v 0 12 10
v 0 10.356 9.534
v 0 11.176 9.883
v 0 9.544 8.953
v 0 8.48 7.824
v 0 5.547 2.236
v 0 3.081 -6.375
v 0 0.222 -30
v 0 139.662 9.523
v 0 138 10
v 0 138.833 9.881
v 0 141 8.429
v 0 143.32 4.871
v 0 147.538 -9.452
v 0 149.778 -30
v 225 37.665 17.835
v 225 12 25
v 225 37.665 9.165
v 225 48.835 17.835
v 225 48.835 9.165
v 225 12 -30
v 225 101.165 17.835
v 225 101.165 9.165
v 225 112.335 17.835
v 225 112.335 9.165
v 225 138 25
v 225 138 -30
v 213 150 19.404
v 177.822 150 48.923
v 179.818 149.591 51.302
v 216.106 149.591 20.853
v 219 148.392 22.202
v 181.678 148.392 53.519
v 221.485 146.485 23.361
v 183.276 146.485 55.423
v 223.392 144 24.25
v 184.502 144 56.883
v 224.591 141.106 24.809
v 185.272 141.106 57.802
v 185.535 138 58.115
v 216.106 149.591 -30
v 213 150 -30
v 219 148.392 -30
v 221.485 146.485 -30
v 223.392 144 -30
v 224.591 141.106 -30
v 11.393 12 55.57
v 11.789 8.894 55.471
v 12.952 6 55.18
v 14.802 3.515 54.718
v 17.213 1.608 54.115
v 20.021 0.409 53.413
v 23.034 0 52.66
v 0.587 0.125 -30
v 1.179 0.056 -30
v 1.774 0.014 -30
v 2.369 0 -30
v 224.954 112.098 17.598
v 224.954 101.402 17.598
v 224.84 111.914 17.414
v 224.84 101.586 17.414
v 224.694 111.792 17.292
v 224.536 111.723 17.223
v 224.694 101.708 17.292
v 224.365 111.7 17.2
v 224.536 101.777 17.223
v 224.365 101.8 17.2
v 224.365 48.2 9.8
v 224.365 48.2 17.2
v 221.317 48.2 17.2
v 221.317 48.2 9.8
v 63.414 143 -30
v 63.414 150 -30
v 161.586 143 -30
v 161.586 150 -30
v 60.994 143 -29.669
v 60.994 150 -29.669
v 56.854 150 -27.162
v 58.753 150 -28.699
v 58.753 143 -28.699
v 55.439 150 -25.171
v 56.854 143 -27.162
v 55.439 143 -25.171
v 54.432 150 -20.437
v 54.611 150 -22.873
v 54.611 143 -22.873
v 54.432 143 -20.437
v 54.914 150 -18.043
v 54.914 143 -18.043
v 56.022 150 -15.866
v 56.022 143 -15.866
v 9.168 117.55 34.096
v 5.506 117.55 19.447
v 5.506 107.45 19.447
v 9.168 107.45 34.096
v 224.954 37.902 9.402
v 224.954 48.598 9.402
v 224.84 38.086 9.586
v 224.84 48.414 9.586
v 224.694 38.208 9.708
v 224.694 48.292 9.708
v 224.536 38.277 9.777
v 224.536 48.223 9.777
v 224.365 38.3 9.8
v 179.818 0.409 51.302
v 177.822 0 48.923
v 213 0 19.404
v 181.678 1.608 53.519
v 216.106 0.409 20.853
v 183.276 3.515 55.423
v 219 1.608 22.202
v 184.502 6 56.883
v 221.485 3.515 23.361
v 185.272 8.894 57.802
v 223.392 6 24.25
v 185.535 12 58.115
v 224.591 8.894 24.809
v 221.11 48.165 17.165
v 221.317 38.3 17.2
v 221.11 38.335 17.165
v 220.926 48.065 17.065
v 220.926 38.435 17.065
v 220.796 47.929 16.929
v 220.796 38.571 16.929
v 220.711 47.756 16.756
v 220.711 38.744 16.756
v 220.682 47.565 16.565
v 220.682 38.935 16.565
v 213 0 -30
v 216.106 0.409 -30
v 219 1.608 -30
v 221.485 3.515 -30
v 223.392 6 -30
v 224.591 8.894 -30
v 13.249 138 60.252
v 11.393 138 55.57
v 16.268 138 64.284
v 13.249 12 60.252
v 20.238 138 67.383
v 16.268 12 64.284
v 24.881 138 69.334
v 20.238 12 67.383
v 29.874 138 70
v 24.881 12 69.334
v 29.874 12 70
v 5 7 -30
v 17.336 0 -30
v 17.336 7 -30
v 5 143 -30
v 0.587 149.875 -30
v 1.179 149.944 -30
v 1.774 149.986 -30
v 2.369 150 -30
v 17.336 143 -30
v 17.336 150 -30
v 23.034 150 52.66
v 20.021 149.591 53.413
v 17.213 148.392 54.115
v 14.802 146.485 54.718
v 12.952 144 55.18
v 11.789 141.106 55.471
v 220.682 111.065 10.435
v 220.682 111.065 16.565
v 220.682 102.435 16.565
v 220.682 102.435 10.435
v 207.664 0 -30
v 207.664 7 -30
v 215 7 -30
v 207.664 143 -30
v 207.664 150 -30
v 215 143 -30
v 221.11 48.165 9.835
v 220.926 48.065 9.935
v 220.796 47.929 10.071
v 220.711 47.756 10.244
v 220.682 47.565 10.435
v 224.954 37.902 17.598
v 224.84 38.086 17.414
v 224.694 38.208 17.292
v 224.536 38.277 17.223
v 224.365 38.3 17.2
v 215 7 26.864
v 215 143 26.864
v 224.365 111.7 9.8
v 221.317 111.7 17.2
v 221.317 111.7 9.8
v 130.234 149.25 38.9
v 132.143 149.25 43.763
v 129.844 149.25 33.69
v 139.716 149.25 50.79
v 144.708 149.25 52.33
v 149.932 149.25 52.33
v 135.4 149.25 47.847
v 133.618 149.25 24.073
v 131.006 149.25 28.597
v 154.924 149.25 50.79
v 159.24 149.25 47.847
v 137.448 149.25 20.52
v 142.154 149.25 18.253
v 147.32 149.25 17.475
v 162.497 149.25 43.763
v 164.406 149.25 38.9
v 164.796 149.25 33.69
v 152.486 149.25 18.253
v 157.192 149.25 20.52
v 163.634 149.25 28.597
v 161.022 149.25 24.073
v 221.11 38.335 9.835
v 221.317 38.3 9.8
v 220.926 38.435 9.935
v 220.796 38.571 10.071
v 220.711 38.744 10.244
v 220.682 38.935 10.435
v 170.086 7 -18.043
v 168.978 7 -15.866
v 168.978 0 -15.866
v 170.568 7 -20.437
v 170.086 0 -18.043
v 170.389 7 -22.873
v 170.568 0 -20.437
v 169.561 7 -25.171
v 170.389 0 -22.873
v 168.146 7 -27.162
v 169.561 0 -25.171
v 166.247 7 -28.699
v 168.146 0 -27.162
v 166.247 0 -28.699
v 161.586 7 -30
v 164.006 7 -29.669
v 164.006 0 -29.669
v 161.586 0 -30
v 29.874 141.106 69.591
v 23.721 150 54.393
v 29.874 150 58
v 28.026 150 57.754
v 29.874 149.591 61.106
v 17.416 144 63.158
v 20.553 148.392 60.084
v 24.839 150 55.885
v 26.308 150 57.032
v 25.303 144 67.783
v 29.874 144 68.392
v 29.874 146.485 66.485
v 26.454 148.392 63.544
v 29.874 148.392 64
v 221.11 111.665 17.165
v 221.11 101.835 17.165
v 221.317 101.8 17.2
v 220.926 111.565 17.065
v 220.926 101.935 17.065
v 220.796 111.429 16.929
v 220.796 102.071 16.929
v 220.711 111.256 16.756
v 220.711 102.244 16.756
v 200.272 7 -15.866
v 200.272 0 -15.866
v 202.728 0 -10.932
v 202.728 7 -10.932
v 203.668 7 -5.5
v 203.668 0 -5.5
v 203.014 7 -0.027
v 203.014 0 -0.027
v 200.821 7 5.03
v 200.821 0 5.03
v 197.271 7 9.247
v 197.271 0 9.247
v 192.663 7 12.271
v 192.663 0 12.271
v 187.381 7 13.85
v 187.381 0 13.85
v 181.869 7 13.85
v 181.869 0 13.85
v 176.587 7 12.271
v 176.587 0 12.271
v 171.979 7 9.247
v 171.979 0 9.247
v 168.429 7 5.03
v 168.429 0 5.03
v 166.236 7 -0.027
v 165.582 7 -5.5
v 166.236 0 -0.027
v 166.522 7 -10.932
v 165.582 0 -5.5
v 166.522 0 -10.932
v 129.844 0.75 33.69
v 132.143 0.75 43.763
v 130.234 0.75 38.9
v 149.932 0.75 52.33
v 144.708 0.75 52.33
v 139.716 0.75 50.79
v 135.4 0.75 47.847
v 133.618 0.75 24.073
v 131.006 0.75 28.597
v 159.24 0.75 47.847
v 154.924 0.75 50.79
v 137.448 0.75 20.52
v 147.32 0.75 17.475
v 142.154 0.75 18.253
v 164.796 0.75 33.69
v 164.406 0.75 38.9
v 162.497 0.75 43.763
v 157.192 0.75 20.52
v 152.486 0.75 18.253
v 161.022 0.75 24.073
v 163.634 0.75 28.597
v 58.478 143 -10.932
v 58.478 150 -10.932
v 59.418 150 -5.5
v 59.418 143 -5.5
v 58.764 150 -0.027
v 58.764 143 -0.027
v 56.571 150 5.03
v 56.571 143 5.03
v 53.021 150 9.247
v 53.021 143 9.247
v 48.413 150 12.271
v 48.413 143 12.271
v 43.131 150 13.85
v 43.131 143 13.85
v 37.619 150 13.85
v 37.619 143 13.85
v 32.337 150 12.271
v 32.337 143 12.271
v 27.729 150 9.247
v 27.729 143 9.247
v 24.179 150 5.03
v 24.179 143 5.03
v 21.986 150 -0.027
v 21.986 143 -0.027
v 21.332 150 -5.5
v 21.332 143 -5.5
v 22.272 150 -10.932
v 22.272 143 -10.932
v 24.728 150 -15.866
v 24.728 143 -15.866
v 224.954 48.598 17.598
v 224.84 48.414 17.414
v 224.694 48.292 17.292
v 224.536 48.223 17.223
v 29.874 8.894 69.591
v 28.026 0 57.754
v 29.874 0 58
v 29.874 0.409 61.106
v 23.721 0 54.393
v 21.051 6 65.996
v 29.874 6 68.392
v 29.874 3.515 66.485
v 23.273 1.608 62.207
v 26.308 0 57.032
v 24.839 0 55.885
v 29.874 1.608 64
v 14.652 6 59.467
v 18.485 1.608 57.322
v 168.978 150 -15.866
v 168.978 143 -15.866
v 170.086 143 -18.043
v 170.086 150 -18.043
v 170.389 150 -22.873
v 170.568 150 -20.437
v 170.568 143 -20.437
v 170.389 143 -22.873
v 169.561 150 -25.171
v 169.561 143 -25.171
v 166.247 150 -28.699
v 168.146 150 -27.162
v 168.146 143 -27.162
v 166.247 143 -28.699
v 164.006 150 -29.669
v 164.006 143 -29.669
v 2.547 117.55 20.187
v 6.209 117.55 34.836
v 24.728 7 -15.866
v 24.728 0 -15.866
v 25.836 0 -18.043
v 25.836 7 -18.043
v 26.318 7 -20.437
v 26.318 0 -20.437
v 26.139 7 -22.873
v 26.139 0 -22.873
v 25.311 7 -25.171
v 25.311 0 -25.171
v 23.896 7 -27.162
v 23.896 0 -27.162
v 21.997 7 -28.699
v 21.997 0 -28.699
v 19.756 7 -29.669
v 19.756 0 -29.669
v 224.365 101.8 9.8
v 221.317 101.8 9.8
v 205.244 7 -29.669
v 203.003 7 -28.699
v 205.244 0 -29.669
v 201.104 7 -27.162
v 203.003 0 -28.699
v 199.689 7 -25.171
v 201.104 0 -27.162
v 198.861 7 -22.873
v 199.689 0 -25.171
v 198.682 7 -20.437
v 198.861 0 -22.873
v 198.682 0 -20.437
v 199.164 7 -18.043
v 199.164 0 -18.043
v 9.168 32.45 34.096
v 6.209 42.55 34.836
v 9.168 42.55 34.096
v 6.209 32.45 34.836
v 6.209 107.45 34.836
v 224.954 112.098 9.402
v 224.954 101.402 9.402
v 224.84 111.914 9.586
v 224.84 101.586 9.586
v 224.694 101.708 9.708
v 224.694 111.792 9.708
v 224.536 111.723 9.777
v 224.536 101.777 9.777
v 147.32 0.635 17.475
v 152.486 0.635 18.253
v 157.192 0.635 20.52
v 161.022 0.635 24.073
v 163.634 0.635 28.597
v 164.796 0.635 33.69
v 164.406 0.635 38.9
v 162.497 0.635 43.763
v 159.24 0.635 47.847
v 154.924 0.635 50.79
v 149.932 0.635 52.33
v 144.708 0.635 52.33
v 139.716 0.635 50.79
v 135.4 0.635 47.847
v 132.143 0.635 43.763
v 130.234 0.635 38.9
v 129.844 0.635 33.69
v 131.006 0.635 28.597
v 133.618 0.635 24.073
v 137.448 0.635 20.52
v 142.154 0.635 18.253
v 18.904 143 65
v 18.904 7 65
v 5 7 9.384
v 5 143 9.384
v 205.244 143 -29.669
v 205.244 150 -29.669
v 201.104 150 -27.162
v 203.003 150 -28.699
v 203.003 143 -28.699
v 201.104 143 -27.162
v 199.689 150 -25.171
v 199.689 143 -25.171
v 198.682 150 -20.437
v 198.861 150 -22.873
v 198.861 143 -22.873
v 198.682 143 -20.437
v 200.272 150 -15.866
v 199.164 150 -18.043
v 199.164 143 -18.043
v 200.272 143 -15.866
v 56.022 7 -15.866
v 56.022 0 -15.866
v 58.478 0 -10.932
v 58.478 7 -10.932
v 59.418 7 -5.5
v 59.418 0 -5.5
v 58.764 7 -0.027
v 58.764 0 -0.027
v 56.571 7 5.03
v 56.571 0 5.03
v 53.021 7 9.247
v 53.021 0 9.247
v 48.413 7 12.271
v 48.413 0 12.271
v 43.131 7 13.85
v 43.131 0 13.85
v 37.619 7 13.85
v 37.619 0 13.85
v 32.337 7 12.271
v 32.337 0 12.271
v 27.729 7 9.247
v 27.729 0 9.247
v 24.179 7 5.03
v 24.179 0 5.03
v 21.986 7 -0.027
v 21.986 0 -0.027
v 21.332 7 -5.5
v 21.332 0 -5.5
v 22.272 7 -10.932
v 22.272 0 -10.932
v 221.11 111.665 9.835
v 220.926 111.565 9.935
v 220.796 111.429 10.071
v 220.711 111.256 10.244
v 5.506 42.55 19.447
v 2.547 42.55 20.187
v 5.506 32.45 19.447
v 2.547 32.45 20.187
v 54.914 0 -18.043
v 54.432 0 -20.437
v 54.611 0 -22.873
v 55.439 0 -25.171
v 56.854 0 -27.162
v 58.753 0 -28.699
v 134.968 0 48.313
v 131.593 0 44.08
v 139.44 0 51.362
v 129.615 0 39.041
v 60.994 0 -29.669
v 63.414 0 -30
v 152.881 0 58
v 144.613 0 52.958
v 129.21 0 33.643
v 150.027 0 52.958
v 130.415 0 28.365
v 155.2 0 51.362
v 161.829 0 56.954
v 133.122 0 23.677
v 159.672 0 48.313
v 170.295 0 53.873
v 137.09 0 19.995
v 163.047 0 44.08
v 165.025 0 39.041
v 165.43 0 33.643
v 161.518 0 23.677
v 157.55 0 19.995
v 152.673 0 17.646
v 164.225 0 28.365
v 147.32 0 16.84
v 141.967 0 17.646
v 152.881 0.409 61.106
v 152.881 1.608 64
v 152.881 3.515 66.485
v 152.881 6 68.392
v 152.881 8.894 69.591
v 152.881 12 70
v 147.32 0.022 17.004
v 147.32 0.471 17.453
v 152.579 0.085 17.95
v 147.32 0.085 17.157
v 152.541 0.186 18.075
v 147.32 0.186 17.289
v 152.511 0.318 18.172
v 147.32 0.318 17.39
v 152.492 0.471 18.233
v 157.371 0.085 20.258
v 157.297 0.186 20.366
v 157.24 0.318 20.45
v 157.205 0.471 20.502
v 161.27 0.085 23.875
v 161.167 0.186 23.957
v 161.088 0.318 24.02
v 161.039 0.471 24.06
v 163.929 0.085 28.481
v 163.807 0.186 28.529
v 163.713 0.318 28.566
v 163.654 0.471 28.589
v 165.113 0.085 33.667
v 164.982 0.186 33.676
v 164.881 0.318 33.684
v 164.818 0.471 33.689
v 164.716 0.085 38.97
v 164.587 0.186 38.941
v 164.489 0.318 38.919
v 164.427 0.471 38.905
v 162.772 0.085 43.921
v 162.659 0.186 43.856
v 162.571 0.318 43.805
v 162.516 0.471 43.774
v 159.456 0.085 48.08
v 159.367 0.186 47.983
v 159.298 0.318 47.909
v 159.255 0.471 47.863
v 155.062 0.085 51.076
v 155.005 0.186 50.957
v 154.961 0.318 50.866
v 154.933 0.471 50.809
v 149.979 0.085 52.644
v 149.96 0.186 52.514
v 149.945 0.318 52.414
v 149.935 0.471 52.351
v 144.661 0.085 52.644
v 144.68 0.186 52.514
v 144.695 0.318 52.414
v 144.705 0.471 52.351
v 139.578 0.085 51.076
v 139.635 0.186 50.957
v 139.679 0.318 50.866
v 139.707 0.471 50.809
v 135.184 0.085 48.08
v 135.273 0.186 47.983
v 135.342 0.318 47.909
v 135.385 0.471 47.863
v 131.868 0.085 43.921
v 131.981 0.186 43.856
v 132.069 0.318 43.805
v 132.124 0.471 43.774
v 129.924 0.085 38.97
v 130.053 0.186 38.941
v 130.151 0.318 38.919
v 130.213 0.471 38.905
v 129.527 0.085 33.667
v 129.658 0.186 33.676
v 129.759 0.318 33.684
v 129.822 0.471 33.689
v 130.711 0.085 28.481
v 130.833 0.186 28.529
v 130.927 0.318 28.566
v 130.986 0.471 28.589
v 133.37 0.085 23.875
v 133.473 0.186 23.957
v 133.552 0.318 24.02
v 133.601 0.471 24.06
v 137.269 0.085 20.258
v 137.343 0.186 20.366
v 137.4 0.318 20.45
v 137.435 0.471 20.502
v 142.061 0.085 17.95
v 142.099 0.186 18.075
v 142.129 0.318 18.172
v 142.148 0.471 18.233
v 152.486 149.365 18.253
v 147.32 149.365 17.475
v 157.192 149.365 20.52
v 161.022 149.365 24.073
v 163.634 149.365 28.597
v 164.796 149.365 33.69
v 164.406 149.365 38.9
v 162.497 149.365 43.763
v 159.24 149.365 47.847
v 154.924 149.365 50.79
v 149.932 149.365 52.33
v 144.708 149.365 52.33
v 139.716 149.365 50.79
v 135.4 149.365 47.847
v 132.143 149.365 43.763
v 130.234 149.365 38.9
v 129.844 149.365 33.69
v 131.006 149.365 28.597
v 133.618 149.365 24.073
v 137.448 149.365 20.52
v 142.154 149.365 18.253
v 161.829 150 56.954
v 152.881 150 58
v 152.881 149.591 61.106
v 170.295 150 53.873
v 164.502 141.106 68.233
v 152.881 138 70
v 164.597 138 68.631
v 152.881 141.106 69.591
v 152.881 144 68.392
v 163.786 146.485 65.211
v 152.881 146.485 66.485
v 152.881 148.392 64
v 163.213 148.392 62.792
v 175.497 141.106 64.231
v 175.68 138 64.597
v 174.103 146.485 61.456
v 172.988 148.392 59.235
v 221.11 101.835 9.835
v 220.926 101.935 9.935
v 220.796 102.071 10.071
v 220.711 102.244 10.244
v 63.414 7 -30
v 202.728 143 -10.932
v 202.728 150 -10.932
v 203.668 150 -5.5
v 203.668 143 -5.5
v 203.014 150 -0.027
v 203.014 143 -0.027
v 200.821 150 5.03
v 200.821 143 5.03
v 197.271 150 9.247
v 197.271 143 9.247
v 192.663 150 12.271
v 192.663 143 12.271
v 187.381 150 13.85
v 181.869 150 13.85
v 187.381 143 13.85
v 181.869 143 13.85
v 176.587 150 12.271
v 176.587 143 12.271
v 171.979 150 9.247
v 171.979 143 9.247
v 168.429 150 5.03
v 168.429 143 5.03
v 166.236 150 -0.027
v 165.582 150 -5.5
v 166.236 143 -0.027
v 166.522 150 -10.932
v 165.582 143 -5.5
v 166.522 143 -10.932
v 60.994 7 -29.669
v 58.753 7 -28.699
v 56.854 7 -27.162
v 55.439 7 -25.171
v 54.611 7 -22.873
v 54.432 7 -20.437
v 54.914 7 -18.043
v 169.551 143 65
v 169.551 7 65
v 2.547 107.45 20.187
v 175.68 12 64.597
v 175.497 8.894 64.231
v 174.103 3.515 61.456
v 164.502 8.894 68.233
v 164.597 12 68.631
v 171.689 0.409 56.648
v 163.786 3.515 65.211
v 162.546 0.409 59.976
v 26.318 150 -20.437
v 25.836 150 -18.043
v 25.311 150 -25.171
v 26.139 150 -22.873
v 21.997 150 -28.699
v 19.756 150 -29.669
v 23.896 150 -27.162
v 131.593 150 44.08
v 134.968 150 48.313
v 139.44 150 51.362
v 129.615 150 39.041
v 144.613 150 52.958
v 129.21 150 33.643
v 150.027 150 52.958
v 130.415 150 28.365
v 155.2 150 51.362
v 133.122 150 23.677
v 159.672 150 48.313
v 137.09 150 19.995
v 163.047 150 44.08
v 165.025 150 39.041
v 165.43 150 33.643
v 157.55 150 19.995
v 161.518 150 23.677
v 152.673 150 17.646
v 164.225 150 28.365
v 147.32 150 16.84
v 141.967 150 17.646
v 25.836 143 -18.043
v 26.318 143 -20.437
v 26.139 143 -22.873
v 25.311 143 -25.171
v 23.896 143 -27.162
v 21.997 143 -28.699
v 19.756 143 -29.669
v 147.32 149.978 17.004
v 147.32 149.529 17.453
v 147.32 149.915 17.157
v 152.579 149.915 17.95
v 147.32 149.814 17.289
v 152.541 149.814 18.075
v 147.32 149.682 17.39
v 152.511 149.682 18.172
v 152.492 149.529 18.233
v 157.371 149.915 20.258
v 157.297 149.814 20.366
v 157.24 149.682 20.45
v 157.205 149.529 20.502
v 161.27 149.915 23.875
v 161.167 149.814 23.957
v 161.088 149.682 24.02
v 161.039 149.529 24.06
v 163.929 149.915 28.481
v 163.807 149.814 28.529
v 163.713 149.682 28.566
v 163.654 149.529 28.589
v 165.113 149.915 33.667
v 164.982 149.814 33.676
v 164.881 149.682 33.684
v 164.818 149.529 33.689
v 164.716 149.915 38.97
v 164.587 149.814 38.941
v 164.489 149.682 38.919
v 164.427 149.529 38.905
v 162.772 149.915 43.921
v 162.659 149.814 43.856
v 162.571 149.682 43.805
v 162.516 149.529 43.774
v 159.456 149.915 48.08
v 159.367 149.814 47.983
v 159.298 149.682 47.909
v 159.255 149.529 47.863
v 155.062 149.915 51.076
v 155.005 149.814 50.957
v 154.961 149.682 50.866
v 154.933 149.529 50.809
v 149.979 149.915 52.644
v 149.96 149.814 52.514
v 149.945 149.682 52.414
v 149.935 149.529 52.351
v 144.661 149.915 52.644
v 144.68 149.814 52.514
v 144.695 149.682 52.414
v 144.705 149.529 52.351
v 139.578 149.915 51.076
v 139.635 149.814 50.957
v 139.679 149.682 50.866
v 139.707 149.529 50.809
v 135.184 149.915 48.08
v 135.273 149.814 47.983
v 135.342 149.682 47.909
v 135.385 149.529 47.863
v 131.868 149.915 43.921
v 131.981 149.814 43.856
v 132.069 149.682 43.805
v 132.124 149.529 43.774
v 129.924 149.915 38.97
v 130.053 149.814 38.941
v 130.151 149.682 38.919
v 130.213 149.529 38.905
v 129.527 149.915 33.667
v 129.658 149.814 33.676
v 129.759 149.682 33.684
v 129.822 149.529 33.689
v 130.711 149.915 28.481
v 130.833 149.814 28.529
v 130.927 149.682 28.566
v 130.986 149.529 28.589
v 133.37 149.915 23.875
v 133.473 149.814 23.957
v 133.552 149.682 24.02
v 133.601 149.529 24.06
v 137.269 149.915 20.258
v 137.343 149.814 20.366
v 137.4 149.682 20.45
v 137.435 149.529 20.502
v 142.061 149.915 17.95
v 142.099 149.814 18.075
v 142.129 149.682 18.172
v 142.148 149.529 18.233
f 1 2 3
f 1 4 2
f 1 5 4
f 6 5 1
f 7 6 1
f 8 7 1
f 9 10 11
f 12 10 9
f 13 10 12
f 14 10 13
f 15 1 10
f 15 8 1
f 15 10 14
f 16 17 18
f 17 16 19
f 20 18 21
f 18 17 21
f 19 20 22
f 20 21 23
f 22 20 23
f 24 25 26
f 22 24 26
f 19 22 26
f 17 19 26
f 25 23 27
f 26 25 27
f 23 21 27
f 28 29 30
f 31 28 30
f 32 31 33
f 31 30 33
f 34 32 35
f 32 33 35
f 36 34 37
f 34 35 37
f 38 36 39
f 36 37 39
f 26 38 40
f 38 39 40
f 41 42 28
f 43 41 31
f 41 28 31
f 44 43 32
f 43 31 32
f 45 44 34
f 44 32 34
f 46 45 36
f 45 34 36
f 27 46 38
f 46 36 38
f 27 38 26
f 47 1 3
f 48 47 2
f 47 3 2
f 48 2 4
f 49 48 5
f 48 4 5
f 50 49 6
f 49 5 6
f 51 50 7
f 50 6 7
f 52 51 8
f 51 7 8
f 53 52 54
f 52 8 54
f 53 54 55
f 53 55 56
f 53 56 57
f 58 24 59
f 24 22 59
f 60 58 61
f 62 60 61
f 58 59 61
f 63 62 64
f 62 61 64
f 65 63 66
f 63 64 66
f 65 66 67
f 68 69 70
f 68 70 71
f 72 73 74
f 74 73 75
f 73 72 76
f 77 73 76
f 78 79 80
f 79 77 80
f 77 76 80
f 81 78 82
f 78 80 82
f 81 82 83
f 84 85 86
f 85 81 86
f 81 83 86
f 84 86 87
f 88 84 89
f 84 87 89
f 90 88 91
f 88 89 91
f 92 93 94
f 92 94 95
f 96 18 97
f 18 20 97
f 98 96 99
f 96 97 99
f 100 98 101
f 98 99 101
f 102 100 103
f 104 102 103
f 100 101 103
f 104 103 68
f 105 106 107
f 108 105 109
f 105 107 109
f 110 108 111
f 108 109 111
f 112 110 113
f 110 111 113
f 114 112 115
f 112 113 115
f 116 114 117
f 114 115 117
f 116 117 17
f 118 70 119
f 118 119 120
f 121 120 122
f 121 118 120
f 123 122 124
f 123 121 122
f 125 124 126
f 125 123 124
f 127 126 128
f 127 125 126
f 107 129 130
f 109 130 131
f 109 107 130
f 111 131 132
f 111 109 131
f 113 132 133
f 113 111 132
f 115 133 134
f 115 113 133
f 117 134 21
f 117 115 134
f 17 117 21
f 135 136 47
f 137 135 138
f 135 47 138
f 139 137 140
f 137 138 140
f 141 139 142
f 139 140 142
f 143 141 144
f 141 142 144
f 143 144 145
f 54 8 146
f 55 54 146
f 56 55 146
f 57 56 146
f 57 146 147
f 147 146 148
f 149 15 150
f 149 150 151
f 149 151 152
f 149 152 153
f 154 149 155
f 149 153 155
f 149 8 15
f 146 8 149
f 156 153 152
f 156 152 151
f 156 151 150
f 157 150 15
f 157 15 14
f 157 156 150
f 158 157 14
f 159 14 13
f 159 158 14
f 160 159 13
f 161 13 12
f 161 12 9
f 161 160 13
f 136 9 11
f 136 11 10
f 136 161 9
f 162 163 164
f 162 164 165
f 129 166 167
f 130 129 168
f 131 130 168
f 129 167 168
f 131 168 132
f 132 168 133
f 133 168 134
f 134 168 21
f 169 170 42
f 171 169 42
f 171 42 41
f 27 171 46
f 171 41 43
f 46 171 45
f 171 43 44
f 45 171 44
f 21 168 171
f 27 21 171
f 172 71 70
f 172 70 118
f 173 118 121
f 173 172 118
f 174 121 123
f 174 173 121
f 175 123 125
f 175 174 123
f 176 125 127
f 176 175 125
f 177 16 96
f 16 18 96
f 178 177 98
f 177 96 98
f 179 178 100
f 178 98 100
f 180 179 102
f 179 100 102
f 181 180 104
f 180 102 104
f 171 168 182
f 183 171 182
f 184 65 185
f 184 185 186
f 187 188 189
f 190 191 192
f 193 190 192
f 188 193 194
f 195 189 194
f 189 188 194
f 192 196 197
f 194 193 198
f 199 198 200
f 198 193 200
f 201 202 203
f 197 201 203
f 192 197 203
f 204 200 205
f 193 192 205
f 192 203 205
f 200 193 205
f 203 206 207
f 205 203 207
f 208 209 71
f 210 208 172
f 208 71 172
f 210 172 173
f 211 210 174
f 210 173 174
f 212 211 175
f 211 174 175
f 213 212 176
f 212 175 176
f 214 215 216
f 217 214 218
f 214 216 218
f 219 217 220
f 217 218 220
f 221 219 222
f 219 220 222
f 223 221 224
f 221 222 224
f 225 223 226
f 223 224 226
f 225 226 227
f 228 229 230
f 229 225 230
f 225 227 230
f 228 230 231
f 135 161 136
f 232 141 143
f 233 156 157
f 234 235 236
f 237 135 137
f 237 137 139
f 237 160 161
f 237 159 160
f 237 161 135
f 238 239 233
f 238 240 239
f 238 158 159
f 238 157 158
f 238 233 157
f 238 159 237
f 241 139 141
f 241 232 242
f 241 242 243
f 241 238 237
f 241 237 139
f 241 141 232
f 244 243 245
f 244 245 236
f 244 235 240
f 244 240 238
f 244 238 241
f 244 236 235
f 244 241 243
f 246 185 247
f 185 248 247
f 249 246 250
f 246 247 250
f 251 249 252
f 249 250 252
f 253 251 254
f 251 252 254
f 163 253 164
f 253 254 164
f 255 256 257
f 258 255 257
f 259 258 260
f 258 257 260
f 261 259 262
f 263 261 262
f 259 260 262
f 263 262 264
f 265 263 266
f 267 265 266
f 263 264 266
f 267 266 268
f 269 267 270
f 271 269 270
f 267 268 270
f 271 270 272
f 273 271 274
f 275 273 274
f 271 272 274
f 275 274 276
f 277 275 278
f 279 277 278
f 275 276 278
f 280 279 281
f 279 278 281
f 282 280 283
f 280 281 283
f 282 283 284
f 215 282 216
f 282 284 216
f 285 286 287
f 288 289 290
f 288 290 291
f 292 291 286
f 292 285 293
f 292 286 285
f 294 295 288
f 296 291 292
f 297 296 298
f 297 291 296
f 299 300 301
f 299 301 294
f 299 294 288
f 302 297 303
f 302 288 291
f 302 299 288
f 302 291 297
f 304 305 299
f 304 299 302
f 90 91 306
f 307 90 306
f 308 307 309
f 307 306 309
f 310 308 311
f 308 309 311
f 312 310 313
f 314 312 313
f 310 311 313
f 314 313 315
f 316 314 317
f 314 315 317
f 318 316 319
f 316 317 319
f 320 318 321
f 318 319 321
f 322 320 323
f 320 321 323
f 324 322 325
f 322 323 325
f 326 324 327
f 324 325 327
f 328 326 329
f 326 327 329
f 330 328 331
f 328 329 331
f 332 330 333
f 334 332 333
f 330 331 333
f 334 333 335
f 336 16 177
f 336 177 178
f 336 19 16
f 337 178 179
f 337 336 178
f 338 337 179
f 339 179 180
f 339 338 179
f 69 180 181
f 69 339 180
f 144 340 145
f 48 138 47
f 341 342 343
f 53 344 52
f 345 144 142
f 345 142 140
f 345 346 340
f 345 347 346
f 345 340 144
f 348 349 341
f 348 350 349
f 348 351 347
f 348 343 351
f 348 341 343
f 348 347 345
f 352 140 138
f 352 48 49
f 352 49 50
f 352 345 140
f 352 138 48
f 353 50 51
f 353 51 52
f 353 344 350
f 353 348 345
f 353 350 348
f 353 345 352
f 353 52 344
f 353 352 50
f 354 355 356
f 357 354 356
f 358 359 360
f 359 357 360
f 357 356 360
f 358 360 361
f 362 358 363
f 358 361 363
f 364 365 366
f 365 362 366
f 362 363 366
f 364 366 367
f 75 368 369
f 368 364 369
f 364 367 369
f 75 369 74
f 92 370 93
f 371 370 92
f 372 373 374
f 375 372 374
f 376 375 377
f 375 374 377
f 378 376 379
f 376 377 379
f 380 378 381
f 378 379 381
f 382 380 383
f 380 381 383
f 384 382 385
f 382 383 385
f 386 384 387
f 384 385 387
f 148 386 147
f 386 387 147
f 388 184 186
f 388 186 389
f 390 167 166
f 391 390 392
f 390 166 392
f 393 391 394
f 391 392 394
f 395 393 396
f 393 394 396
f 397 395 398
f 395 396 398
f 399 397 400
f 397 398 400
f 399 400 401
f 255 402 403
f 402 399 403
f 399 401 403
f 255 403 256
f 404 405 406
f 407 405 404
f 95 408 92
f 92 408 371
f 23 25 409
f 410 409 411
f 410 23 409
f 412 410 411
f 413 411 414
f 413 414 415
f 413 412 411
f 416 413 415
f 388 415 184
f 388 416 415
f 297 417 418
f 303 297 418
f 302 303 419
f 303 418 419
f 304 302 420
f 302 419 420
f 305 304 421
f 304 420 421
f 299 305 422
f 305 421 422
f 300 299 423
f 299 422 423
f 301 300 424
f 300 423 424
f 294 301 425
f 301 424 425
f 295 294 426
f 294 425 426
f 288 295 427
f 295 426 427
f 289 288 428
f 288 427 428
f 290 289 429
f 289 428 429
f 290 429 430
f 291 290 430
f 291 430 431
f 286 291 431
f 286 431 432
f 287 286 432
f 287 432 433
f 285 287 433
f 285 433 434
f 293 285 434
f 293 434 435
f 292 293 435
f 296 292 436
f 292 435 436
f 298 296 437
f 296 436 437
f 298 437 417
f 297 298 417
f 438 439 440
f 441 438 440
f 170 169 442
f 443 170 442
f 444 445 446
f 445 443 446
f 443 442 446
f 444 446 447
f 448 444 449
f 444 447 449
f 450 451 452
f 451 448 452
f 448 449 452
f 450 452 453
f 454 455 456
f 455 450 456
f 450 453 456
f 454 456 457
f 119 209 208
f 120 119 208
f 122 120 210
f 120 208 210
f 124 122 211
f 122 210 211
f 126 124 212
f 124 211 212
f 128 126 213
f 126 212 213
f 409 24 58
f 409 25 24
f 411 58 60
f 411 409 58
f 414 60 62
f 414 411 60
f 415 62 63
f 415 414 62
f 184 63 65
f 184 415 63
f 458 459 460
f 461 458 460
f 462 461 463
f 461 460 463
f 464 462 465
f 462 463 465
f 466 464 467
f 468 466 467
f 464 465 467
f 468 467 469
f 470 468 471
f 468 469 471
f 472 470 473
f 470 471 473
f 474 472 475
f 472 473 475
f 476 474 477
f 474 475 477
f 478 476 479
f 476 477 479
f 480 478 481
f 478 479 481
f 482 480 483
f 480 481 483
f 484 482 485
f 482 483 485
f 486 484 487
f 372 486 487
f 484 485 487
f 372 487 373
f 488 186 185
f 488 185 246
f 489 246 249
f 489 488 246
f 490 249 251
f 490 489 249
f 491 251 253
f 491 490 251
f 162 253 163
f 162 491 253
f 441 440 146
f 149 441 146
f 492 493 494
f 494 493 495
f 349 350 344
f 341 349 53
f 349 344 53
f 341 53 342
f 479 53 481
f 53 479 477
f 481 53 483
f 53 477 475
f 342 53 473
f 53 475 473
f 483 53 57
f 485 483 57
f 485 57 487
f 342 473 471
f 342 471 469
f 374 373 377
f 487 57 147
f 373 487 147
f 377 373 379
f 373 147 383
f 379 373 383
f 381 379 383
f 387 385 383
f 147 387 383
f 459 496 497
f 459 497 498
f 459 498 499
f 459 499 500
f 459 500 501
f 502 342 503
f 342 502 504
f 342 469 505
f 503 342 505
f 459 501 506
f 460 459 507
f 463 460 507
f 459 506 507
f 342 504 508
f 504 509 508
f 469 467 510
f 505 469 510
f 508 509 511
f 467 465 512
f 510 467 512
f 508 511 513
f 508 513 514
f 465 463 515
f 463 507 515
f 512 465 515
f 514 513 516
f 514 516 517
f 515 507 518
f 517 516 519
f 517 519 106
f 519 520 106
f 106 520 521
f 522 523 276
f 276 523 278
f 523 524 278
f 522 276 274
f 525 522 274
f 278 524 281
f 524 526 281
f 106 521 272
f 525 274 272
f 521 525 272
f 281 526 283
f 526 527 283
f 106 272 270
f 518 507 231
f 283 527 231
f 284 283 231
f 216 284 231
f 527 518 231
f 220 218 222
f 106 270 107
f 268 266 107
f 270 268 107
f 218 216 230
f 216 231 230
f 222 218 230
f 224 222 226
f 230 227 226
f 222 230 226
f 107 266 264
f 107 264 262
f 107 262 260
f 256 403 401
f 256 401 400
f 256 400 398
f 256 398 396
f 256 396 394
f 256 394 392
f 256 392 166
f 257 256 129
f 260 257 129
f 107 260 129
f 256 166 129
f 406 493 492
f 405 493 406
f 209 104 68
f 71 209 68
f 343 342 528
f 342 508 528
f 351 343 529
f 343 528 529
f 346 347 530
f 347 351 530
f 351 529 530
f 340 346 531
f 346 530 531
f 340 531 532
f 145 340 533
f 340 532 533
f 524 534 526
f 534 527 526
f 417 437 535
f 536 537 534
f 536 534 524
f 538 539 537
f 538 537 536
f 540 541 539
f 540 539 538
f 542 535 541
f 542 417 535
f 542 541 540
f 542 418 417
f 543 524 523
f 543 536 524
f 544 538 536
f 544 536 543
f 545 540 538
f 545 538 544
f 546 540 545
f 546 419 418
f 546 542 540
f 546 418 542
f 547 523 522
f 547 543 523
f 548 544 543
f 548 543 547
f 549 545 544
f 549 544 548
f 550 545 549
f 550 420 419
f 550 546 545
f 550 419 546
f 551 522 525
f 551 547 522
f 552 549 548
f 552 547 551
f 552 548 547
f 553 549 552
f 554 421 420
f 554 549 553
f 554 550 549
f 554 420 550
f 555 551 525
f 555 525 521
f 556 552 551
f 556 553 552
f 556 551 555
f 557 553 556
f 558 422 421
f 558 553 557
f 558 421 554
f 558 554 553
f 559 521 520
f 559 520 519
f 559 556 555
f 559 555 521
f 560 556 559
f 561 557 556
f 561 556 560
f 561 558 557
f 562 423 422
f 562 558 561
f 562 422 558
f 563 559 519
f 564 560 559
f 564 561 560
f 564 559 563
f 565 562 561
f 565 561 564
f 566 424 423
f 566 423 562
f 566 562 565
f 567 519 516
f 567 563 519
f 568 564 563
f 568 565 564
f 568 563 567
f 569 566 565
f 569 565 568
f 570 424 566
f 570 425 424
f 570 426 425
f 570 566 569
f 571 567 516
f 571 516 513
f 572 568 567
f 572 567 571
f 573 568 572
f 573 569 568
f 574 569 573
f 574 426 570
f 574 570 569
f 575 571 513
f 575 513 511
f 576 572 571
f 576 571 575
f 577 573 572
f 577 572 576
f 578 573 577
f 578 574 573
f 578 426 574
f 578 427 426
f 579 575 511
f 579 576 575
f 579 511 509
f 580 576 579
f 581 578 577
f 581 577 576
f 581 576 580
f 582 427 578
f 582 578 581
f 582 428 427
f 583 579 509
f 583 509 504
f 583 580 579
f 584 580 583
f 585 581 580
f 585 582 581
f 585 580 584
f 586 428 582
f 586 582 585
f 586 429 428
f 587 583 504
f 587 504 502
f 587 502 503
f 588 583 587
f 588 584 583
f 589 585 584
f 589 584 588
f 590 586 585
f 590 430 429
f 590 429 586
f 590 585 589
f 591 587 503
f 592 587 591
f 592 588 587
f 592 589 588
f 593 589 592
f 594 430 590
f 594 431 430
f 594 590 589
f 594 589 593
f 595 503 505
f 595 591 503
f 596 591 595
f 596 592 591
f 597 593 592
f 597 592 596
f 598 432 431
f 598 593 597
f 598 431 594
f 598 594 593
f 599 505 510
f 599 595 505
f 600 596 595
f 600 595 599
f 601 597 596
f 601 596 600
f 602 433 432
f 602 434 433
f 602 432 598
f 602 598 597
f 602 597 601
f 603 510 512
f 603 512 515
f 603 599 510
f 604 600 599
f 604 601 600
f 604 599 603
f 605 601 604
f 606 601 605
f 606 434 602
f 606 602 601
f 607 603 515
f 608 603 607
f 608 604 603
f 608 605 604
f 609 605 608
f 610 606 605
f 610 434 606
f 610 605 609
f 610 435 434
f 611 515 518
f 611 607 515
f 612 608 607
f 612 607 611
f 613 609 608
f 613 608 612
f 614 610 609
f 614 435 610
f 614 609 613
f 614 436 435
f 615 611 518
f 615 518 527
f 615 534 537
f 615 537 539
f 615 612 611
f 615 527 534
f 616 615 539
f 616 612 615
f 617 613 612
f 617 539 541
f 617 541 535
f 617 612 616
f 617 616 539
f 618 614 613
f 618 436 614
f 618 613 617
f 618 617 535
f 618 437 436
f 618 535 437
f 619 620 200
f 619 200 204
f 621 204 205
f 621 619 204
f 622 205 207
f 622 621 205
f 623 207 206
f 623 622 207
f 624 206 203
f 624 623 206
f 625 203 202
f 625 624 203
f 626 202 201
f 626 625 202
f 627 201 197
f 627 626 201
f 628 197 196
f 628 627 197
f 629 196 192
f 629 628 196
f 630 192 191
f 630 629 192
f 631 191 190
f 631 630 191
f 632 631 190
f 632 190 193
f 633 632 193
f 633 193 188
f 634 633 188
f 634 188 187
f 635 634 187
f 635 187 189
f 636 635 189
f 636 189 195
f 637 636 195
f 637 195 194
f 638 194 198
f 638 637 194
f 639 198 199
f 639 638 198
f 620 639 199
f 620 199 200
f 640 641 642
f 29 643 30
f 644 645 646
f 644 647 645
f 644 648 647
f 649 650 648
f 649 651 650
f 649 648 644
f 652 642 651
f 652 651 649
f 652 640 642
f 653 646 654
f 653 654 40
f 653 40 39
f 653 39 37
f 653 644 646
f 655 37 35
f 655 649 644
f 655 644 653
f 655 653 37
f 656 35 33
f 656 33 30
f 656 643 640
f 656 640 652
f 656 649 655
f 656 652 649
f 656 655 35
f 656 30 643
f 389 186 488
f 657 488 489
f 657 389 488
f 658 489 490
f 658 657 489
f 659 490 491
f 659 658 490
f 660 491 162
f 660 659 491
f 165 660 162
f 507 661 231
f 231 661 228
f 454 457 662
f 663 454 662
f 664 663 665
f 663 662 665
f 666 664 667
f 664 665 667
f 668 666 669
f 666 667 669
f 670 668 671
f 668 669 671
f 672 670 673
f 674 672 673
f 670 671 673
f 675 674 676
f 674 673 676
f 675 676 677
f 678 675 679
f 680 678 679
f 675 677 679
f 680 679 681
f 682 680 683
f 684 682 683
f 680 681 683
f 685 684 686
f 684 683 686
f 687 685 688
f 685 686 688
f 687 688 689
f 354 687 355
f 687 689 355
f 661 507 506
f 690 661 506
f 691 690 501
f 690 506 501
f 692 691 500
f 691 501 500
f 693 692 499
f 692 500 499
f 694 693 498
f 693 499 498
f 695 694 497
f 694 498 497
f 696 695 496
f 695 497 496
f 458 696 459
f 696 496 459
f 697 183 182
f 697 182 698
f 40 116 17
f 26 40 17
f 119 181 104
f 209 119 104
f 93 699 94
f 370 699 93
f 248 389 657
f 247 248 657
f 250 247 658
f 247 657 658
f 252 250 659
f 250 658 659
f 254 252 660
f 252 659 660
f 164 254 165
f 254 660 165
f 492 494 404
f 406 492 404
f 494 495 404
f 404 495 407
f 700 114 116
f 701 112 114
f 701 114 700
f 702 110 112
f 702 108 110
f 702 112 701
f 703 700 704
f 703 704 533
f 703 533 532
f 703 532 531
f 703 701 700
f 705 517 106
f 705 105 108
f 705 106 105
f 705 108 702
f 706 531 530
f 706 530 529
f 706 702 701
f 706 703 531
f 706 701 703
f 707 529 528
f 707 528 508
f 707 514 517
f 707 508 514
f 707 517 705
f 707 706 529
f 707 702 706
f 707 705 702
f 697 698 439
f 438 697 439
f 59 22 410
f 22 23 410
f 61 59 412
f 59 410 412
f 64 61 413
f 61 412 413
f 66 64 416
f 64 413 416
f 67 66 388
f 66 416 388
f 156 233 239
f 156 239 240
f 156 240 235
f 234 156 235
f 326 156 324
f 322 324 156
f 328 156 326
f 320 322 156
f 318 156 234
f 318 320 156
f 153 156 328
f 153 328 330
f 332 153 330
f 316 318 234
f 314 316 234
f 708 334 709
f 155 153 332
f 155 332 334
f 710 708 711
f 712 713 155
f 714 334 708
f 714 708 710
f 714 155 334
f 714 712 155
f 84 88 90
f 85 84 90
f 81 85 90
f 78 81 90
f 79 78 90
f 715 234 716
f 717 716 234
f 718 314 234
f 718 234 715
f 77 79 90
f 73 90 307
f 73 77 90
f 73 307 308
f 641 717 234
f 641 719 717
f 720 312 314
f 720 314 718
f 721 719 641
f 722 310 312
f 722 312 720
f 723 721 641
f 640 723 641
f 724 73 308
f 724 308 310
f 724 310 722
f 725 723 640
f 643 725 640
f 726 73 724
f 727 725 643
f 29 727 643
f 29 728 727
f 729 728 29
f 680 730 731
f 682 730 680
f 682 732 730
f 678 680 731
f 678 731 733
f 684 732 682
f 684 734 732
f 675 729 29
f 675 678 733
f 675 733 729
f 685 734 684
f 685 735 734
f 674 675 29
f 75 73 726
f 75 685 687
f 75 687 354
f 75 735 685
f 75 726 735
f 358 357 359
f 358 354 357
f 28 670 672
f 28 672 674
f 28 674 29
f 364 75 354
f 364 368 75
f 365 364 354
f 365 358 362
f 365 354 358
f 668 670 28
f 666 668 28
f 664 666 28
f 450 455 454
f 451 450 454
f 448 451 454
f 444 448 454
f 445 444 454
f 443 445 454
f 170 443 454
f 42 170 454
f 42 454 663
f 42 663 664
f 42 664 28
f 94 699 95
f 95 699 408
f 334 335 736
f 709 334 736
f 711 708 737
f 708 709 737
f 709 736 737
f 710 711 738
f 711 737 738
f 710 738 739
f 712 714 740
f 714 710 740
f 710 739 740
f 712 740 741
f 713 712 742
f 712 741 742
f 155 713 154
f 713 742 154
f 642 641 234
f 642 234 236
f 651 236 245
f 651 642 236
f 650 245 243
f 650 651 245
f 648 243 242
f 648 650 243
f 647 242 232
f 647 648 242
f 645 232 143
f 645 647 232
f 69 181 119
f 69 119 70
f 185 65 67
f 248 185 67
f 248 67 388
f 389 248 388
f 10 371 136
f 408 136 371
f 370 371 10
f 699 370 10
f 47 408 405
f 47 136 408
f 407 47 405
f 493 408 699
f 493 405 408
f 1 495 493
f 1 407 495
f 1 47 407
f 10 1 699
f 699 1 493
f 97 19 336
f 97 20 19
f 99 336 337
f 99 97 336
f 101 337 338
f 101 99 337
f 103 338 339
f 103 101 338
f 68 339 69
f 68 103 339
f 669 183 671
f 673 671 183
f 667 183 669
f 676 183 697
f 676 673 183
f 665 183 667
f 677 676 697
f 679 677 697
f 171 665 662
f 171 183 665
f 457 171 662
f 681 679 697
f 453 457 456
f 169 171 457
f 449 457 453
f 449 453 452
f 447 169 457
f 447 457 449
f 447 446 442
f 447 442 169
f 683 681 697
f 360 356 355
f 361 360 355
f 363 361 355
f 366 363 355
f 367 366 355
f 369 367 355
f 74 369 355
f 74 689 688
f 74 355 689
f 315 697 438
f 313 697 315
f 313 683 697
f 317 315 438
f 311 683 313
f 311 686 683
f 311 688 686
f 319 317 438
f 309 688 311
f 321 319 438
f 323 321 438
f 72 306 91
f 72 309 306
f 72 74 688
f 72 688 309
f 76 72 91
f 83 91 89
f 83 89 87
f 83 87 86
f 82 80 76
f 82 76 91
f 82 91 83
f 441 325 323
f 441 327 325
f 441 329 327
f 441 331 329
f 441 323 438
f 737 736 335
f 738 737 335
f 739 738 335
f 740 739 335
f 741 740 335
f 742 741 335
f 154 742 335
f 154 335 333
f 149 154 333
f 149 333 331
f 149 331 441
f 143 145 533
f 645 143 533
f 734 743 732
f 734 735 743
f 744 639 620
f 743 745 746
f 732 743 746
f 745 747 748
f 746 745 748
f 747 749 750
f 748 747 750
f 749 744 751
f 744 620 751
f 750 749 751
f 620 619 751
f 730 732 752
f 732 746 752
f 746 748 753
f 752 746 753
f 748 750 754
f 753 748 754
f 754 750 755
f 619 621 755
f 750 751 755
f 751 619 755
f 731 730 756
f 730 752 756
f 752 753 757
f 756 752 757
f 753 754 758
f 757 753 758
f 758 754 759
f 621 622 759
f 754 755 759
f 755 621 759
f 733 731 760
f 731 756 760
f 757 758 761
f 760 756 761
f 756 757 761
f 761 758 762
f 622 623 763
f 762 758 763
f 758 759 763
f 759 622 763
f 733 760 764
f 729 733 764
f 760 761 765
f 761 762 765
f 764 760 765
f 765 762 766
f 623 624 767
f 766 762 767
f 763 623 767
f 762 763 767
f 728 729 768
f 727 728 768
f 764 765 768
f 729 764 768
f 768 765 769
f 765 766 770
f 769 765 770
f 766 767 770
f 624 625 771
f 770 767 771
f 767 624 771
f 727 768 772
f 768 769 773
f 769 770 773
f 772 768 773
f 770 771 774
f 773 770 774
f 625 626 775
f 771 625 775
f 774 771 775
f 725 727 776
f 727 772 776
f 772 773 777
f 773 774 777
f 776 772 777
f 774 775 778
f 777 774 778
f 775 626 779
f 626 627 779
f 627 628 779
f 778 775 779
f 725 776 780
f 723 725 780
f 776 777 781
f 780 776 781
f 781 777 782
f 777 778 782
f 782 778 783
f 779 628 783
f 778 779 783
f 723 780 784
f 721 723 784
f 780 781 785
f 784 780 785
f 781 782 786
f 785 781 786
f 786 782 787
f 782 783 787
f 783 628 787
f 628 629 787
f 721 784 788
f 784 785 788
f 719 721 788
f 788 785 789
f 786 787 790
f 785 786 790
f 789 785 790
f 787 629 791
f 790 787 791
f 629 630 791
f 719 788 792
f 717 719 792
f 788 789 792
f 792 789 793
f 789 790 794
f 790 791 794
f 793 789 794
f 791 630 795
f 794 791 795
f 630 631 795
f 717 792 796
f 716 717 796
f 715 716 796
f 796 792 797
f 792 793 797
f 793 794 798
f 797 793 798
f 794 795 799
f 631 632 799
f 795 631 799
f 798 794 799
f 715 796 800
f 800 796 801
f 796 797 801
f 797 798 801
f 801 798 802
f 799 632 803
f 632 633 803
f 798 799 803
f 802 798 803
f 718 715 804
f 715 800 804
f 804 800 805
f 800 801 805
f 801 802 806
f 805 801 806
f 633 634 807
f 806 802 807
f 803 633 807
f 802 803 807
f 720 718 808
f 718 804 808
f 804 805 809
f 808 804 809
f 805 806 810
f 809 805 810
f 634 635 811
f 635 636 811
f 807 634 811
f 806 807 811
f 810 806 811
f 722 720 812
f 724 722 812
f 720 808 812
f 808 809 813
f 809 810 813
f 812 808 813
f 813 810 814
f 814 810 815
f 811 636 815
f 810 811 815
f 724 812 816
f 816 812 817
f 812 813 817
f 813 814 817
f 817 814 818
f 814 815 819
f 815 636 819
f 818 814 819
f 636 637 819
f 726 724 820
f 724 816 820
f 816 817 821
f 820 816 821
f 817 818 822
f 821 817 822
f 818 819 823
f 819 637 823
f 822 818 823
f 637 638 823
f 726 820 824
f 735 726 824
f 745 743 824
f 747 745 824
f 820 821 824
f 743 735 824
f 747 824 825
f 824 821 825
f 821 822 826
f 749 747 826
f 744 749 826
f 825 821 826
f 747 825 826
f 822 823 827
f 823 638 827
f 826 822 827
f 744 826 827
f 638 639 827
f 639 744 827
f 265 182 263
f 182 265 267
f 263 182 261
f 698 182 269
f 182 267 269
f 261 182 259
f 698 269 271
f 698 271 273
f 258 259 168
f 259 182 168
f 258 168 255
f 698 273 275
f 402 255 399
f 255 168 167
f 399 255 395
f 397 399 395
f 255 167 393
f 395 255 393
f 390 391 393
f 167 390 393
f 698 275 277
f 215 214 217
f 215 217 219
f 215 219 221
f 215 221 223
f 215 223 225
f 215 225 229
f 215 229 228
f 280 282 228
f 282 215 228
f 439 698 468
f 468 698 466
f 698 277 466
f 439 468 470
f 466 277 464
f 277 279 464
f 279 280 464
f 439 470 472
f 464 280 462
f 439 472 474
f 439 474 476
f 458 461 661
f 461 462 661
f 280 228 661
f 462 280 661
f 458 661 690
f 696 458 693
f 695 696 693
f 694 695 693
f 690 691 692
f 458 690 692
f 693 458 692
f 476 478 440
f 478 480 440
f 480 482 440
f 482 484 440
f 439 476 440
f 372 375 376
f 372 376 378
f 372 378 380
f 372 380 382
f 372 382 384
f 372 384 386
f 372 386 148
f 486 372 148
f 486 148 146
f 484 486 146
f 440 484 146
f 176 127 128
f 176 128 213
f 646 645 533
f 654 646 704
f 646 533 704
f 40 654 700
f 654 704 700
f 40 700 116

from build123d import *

# Parameters (mm, degrees)
BOSS_EXTRUDE1_DEPTH      = 70
BOSS_EXTRUDE1_DEPTH_BACK = 30
SKETCH1_W                = 225
SKETCH1_H                = 150
CUT_EXTRUDE1_DEPTH       = 280.329554469
CUT_EXTRUDE2_DEPTH       = 68
CUT_EXTRUDE2_DEPTH_BACK  = 68
SKETCH8_R                = 19.05
CUT_EXTRUDE3_DEPTH       = 185
FILLET1_R                = 12
FILLET2_R                = 50.8
FILLET3_R                = 19.05
SKETCH13_W               = 7.4
SKETCH13_H               = 9.9
CUT_EXTRUDE4_DEPTH       = 4.318
FILLET4_R                = 0.635
FILLET4_OF_MIRROR2_R     = 0.635
SKETCH14_R               = 17.5254
CUT_EXTRUDE5_DEPTH       = 0.75
FILLET5_R                = 0.635
FILLET6_R                = 0.635
SKETCH16_W               = 15.1
SKETCH16_H               = 10.1
CUT_EXTRUDE6_DEPTH       = 3.05


with BuildPart() as part:
    # Sketch1 → Boss-Extrude1 (new, two sides: drawn at the far end of the back side and taken through both)
    with BuildSketch(Plane.XY.offset(-BOSS_EXTRUDE1_DEPTH_BACK)):
        with Locations((112.5, 75)):
            Rectangle(SKETCH1_W, SKETCH1_H)
    extrude(amount=BOSS_EXTRUDE1_DEPTH + BOSS_EXTRUDE1_DEPTH_BACK)

    # Sketch2 → Cut-Extrude1 (cut, through all)
    with BuildSketch(Plane.XZ):
        Polygon((225, 70), (171.371088333, 70), (225, 25), align=None)
        Polygon((0, 70), (15, 70), (0, 10), align=None)
    extrude(amount=-CUT_EXTRUDE1_DEPTH, mode=Mode.SUBTRACT)

    # Sketch7 → Cut-Extrude2 (cut, two sides: drawn at the far end of the back side and taken through both)
    with BuildSketch(Plane(origin=(0, 75, 0), x_dir=(1, 0, 0), z_dir=(0, 1, 0)).offset(-CUT_EXTRUDE2_DEPTH_BACK)):
        Polygon((215, 30.615528128), (215, -26.863959865), (169.551237162, -65), (18.903882032, -65), (5, -9.384471872), (5, 30.615528128), align=None)
    extrude(amount=CUT_EXTRUDE2_DEPTH + CUT_EXTRUDE2_DEPTH_BACK, mode=Mode.SUBTRACT)

    # Sketch8 → Cut-Extrude3 (cut)
    with BuildSketch(Plane.XZ):
        with Locations((40.375, -5)):
            Circle(SKETCH8_R)
        with BuildLine():
            Line((17.33584854, -30), (63.41415146, -30))
            ThreePointArc((63.41415146, -30), (55.439090064, -25.17113842), (56.02191035, -15.86631016))
            ThreePointArc((56.02191035, -15.86631016), (40.375, -24.05), (24.72808965, -15.86631016))
            ThreePointArc((24.72808965, -15.86631016), (25.310909936, -25.17113842), (17.33584854, -30))
        make_face()
        with Locations((184.625, -5)):
            Circle(SKETCH8_R)
        with BuildLine():
            ThreePointArc((200.27191035, -15.86631016), (184.625, -24.05), (168.97808965, -15.86631016))
            ThreePointArc((168.97808965, -15.86631016), (169.560909936, -25.17113842), (161.58584854, -30))
            Line((161.58584854, -30), (207.66415146, -30))
            ThreePointArc((207.66415146, -30), (199.689090064, -25.17113842), (200.27191035, -15.86631016))
        make_face()
    extrude(amount=-CUT_EXTRUDE3_DEPTH, mode=Mode.SUBTRACT)

    # Fillet1
    fillet1_edges = [part.edges().sort_by_distance(p)[0] for p in [
        (198.185544167, 0, 47.5),
        (225, 0, -2.5),
        (7.5, 0, 40),
        (93.185544167, 0, 70),
        (7.5, 150, 40),
        (93.185544167, 150, 70),
        (198.185544167, 150, 47.5),
        (225, 150, -2.5),
    ]]
    fillet(fillet1_edges, radius=FILLET1_R)

    # Fillet2
    # the kernel refuses this fillet: 50.8 mm, written as the material it takes off along each edge
    with BuildSketch(Plane(origin=(152.881400433, 150, 19.2), x_dir=(0, 0, 1), z_dir=(-1, 0, 0))) as fillet2_piece_1:
        with BuildLine():
            CenterArc((38.8, -12), 12, 0, 90)
            Line((50.8, -12), (50.8, 0))
            Line((50.8, 0), (38.8, 0))
        make_face()
    revolve(axis=Axis((152.881400433, 150, 19.2), (0, 1, 0)), revolution_arc=40, mode=Mode.SUBTRACT)
    with BuildSketch(Plane(origin=(152.881400433, 0, 19.2), x_dir=(0.6427876096865435, 0, 0.7660444431189747), z_dir=(0.7660444431189747, 0, -0.6427876096865435))) as fillet2_piece_2:
        with BuildLine():
            CenterArc((38.8, -12), 12, 0, 90)
            Line((50.8, -12), (50.8, 0))
            Line((50.8, 0), (38.8, 0))
        make_face()
    revolve(axis=Axis((152.881400433, 0, 19.2), (0, -1, 0)), revolution_arc=40, mode=Mode.SUBTRACT)
    with BuildSketch(Plane(origin=(171.371088333, 0, 70), x_dir=(-1, 0, 0), z_dir=(0, 1, 0))) as fillet2_piece_3:
        with BuildLine():
            CenterArc((FILLET2_R * 0.363970234266, -FILLET2_R), FILLET2_R, 90, 40)
            Line((-FILLET2_R * 0.27881737542, -FILLET2_R * 0.233955556881), (0, 0))
            Line((0, 0), (FILLET2_R * 0.363970234266, 0))
        make_face()
    extrude(amount=150, mode=Mode.SUBTRACT)

    # Fillet3
    # the kernel refuses this fillet: 19.05 mm, written as the material it takes off along each edge
    with BuildSketch(Plane(origin=(29.873790542, 150, 50.95), x_dir=(-0.9701425001453319, 0, 0.24253562503633305), z_dir=(-0.24253562503633305, 0, -0.9701425001453319))) as fillet3_piece_1:
        with BuildLine():
            CenterArc((7.05, -12), 12, 0, 90)
            Line((19.05, -12), (19.05, 0))
            Line((19.05, 0), (7.05, 0))
        make_face()
    fillet3_piece_1_solid = revolve(axis=Axis((29.873790542, 150, 50.95), (0, 1, 0)), revolution_arc=75.963756532, mode=Mode.PRIVATE)
    with BuildSketch(Plane(origin=(29.873790542, 0, 50.95), x_dir=(0, 0, 1), z_dir=(1, 0, 0))) as fillet3_piece_2:
        with BuildLine():
            CenterArc((7.05, -12), 12, 0, 90)
            Line((19.05, -12), (19.05, 0))
            Line((19.05, 0), (7.05, 0))
        make_face()
    fillet3_piece_2_solid = revolve(axis=Axis((29.873790542, 0, 50.95), (0, -1, 0)), revolution_arc=75.963756532, mode=Mode.PRIVATE)
    with BuildSketch(Plane(origin=(15, 0, 70), x_dir=(1, 0, 0), z_dir=(0, 1, 0))) as fillet3_piece_3:
        with BuildLine():
            CenterArc((FILLET3_R * 0.780776406404, FILLET3_R), FILLET3_R, 194.036243468, 75.963756532)
            Line((-FILLET3_R * 0.189366093741, FILLET3_R * 0.757464374964), (0, 0))
            Line((0, 0), (FILLET3_R * 0.780776406404, 0))
        make_face()
    fillet3_piece_3_solid = extrude(amount=150, mode=Mode.PRIVATE)
    add([fillet3_piece_1_solid, fillet3_piece_2_solid, fillet3_piece_3_solid], mode=Mode.SUBTRACT)

    # Sketch13 → Cut-Extrude4 (cut)
    with BuildSketch(Plane(origin=(225, 0, 0), x_dir=(0, 0, -1), z_dir=(1, 0, 0))):
        with Locations((-13.5, 43.25)):
            Rectangle(SKETCH13_W, SKETCH13_H)
    cut_extrude4 = extrude(amount=-CUT_EXTRUDE4_DEPTH, mode=Mode.SUBTRACT)

    # Fillet4
    fillet4_edges = [part.edges().sort_by_distance(p)[0] for p in [
        (220.682, 43.25, 9.8),
        (220.682, 38.3, 13.5),
        (220.682, 43.25, 17.2),
        (220.682, 48.2, 13.5),
        (225, 43.25, 9.8),
        (225, 48.2, 13.5),
        (225, 43.25, 17.2),
        (225, 38.3, 13.5),
    ]]
    fillet(fillet4_edges, radius=FILLET4_R)

    # Mirror2: Cut-Extrude4 across plane
    add(cut_extrude4.mirror(Plane.ZX.offset(75)), mode=Mode.SUBTRACT)

    # Fillet4 of Mirror2
    fillet4_of_mirror2_edges = [part.edges().sort_by_distance(p)[0] for p in [
        (220.682, 106.75, 9.8),
        (220.682, 111.7, 13.5),
        (220.682, 106.75, 17.2),
        (220.682, 101.8, 13.5),
        (225, 106.75, 9.8),
        (225, 101.8, 13.5),
        (225, 106.75, 17.2),
        (225, 111.7, 13.5),
    ]]
    fillet(fillet4_of_mirror2_edges, radius=FILLET4_OF_MIRROR2_R)

    # Sketch14 → Cut-Extrude5 (cut)
    with BuildSketch(Plane.XZ):
        with Locations(Location((147.32, 35, 0), (0, 0, 270))):
            Circle(SKETCH14_R)
    cut_extrude5 = extrude(amount=-CUT_EXTRUDE5_DEPTH, mode=Mode.SUBTRACT)

    # Fillet5
    fillet5_edges = [part.edges().sort_by_distance(p)[0] for p in [
        (147.32, 0, 52.5254),
    ]]
    fillet(fillet5_edges, radius=FILLET5_R)

    # Mirror4: Cut-Extrude5 across plane
    add(cut_extrude5.mirror(Plane.ZX.offset(75)), mode=Mode.SUBTRACT)

    # Fillet6
    fillet6_edges = [part.edges().sort_by_distance(p)[0] for p in [
        (147.32, 150, 52.5254),
    ]]
    fillet(fillet6_edges, radius=FILLET6_R)

    # Sketch16 → Cut-Extrude6 (cut)
    with BuildSketch(Plane(origin=(-2.352941176, 0, 0.588235294), x_dir=(0.24253562503633294, 0, 0.9701425001453319), z_dir=(-0.9701425001453319, 0, 0.24253562503633294))):
        with Locations((27.752024594, 112.5)):
            Rectangle(SKETCH16_W, SKETCH16_H)
    cut_extrude6 = extrude(amount=-CUT_EXTRUDE6_DEPTH, mode=Mode.SUBTRACT)

    # Mirror5: Cut-Extrude6 across plane
    add(cut_extrude6.mirror(Plane.ZX.offset(75)), mode=Mode.SUBTRACT)


solid = part.part
